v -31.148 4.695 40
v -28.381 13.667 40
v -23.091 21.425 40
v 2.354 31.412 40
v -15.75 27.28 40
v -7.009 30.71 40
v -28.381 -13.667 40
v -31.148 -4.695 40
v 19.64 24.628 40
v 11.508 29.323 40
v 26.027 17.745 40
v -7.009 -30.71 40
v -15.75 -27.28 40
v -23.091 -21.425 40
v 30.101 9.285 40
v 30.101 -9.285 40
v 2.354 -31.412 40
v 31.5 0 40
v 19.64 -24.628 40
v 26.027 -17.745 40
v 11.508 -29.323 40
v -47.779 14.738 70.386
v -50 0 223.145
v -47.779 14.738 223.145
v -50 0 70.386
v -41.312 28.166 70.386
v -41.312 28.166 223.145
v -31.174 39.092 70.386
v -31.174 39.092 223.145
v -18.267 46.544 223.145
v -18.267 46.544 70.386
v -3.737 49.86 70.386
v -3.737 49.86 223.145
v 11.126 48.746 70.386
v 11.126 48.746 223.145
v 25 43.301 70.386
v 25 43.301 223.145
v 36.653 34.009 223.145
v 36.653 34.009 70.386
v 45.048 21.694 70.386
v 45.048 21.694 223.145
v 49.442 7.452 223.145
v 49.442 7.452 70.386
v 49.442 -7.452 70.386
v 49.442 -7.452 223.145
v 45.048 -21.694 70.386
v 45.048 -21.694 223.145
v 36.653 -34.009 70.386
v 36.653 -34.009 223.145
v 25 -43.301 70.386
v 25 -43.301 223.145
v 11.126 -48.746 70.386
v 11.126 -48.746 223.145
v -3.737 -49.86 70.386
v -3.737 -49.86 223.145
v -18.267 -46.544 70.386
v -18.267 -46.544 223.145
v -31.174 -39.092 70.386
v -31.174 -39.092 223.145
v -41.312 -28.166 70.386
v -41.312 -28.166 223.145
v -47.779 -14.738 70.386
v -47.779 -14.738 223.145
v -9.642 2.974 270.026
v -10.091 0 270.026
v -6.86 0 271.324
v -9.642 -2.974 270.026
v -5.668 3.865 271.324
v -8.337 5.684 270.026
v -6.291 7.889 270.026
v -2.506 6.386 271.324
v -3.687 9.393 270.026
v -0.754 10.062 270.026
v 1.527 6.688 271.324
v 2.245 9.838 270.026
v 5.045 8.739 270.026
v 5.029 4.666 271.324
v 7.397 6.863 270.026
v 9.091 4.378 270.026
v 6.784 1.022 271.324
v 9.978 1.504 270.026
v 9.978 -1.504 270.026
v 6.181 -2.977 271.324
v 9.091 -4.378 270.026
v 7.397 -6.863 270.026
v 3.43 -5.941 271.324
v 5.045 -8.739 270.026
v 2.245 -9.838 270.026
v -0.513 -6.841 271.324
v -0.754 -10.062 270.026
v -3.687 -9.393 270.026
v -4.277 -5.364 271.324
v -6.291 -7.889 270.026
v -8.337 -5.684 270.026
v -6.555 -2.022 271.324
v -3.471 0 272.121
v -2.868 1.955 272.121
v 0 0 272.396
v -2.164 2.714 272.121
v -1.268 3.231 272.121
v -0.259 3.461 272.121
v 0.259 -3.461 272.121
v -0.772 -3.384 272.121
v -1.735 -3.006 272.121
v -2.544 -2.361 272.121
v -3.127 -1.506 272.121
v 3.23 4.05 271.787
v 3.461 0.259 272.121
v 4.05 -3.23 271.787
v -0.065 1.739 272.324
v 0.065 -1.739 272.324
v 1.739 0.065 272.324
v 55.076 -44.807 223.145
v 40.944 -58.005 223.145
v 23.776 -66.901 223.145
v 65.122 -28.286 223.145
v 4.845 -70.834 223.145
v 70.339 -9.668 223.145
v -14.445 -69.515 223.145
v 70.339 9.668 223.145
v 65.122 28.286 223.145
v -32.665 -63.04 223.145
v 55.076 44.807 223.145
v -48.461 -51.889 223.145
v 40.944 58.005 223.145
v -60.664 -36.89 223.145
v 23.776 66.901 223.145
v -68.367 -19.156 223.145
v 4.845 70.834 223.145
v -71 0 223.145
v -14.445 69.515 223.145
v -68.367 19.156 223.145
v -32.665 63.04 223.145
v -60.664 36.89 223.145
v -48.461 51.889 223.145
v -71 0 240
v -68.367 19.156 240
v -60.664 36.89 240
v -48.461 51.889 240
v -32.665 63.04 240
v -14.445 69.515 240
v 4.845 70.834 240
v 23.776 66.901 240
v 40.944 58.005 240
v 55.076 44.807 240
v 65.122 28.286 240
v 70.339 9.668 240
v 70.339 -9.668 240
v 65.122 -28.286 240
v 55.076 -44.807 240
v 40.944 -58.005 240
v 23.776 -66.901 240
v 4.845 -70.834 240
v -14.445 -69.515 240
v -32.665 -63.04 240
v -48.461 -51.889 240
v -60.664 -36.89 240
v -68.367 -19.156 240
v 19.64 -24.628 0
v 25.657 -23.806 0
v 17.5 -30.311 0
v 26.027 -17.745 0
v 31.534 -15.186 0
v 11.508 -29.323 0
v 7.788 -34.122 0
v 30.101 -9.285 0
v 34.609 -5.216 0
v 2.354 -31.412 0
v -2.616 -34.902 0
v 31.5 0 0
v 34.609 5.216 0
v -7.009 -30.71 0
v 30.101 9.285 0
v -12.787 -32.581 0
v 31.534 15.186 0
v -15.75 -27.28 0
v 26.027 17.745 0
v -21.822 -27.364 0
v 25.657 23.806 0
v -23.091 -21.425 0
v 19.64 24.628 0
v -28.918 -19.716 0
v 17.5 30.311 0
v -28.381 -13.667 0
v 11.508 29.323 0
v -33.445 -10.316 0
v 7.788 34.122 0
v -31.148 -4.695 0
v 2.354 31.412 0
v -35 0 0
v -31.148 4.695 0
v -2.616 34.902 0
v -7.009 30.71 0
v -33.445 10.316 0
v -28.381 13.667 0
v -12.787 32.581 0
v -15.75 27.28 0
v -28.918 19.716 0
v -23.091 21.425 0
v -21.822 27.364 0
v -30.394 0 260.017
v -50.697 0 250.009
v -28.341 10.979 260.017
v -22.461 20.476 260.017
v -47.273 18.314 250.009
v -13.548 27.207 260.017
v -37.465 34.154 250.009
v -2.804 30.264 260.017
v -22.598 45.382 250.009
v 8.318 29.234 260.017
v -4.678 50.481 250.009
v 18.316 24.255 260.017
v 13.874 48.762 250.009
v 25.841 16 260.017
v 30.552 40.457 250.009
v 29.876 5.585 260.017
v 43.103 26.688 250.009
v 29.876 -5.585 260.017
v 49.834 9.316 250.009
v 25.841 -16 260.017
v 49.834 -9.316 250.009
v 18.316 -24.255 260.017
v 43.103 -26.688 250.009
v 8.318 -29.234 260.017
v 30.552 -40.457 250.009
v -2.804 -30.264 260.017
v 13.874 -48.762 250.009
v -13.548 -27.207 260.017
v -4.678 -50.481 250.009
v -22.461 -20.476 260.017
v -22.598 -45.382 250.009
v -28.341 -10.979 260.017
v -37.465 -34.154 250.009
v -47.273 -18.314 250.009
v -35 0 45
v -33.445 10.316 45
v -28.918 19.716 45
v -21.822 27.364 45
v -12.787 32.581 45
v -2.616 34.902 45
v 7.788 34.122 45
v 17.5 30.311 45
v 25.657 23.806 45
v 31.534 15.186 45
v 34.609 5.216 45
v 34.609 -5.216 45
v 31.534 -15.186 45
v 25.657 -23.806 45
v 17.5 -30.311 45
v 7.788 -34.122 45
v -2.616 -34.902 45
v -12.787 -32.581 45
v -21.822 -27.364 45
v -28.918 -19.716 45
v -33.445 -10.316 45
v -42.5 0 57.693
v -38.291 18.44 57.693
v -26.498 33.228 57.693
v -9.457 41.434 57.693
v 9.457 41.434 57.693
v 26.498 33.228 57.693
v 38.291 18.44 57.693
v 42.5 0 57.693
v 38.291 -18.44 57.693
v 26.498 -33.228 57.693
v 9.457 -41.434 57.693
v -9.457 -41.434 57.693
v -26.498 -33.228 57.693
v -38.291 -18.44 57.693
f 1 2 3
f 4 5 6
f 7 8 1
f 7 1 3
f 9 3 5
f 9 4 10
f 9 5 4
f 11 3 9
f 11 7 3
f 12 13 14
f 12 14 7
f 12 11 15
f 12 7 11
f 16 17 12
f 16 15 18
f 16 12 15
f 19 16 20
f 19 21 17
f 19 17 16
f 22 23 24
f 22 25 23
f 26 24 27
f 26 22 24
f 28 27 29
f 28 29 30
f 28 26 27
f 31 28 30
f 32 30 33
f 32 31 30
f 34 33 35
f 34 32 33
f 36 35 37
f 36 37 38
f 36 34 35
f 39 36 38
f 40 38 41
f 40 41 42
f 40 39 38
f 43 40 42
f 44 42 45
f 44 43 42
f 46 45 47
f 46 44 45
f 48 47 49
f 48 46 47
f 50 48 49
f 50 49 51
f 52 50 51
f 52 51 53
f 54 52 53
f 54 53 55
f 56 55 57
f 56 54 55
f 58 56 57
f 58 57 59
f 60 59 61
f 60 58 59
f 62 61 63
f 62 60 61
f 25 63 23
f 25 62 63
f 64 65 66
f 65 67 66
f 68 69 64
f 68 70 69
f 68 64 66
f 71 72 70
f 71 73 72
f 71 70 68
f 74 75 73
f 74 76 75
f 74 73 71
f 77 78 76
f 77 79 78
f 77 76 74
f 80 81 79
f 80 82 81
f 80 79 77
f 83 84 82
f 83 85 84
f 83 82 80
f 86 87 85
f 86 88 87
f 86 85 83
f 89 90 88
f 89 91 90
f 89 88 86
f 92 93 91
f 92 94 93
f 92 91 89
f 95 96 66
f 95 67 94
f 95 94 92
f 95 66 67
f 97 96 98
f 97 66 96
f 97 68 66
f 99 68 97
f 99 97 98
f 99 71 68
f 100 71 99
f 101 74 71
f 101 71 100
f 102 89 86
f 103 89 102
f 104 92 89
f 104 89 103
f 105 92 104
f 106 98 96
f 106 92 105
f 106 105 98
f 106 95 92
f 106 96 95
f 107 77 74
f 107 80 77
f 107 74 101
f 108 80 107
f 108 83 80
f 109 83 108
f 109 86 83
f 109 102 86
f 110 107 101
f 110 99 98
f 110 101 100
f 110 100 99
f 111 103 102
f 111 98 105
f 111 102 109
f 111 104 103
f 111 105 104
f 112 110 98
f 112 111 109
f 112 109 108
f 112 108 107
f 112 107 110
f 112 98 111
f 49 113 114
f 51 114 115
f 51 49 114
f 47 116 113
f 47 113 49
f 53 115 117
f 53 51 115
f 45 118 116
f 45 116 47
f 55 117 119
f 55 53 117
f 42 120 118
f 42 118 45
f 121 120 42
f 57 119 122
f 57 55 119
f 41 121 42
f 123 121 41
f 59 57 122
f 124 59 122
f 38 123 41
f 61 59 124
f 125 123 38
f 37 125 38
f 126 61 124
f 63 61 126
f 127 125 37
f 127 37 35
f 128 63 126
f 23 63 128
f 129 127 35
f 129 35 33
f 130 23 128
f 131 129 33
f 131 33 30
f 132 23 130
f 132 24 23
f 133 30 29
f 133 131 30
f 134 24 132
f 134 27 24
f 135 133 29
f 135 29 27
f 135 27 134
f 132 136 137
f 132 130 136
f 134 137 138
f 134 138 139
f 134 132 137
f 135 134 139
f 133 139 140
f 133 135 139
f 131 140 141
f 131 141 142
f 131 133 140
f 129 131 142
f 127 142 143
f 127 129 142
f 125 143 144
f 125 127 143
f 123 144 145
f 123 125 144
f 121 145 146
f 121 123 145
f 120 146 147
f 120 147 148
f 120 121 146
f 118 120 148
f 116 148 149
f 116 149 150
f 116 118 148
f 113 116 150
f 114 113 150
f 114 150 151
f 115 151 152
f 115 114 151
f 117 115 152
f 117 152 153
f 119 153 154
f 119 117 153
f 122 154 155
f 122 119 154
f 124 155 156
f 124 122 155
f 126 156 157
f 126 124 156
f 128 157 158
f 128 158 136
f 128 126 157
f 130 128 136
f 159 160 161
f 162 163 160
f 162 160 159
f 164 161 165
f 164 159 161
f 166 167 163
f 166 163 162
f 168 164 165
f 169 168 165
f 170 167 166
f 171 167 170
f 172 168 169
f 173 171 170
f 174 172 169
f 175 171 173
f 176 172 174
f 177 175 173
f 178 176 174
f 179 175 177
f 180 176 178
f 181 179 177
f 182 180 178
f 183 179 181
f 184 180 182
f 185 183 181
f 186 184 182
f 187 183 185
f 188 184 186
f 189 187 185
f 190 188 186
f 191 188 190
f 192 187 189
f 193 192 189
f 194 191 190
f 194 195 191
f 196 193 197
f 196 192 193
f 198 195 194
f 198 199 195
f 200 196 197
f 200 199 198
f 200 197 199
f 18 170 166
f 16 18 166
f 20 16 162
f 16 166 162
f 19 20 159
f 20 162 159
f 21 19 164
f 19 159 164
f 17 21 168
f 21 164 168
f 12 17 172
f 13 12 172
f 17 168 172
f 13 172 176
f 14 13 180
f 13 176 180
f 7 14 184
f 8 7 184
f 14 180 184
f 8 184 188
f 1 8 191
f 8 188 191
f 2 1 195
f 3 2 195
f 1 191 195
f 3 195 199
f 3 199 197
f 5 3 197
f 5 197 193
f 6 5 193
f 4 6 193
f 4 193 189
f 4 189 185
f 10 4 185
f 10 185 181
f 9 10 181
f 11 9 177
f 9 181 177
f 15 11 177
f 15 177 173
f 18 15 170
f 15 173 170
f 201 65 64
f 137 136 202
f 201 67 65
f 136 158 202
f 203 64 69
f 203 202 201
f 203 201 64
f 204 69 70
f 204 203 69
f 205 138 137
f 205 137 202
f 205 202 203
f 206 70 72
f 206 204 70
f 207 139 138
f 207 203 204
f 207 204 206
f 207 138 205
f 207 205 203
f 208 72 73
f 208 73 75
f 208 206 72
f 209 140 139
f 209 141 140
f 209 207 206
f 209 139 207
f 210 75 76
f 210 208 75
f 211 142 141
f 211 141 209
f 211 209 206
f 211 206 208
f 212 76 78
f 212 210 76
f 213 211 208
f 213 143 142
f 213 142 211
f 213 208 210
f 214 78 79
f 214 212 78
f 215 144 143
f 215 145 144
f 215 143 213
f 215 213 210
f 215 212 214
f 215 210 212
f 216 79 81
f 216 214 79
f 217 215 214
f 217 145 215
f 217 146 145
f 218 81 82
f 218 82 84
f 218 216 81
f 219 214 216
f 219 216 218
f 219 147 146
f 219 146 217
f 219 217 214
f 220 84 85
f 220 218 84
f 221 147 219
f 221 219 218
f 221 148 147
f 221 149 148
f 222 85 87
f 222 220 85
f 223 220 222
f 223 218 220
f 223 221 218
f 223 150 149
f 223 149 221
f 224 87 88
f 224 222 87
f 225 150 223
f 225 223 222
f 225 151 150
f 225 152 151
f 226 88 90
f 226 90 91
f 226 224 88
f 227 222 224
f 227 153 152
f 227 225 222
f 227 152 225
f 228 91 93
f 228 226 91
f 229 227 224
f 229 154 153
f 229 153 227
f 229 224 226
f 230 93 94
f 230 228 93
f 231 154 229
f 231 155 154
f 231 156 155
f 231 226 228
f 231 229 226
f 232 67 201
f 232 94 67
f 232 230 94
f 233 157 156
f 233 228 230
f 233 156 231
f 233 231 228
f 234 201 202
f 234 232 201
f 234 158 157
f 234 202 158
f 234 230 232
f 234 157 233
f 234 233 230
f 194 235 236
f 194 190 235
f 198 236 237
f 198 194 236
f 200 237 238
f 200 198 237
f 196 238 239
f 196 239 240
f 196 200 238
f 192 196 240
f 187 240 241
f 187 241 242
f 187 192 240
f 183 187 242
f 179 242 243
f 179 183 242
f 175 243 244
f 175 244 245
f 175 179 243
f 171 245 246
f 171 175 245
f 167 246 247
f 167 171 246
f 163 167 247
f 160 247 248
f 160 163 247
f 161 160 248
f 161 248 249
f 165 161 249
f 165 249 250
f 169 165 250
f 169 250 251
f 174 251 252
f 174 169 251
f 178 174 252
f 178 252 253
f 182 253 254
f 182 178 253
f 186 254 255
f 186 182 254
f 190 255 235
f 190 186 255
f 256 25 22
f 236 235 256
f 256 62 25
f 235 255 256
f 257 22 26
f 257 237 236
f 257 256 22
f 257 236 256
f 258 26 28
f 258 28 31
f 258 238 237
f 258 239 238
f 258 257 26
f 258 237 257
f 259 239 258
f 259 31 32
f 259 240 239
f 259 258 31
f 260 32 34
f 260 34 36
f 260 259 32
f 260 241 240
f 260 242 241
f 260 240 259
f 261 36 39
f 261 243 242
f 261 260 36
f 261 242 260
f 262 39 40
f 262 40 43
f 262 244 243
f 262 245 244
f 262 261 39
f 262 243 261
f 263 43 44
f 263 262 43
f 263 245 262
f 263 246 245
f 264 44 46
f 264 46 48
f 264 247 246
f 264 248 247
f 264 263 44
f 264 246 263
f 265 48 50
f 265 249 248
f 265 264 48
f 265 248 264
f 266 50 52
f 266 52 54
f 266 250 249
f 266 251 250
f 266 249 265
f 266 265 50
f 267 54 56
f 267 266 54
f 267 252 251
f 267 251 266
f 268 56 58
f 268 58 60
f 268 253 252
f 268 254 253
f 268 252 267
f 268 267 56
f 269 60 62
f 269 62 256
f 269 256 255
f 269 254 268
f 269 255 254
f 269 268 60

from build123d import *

# Parameters (mm, degrees)
F2_R     = 31.5
F3_DEPTH = 40


with BuildPart() as f1:
    # F0 (on Front) → F1 (revolve)
    with BuildSketch(Plane.XZ):
        with BuildLine():
            Line((-35, 0), (0, 0))
            Line((0, 0), (0, 272.395989))
            ThreePointArc((0, 272.395989), (-5.180591, 271.786704), (-10.090656, 270.025733))
            Line((-10.090656, 270.025733), (-71, 240))
            Line((-71, 240), (-71, 223.14471))
            Line((-71, 223.14471), (-50, 223.14471))
            Line((-50, 223.14471), (-50, 70.386211))
            Line((-50, 70.386211), (-35, 45))
            Line((-35, 45), (-35, 0))
        make_face()
    revolve(axis=Axis((0, 0, 137.5), (0, 0, -1)))

    # F2 (on face) → F3 (cut)
    with BuildSketch(Plane(origin=(0, 0, 0), x_dir=(1, 0, 0), z_dir=(0, 0, -1))):
        Circle(F2_R)
    extrude(amount=-F3_DEPTH, mode=Mode.SUBTRACT)


solid = f1.part
